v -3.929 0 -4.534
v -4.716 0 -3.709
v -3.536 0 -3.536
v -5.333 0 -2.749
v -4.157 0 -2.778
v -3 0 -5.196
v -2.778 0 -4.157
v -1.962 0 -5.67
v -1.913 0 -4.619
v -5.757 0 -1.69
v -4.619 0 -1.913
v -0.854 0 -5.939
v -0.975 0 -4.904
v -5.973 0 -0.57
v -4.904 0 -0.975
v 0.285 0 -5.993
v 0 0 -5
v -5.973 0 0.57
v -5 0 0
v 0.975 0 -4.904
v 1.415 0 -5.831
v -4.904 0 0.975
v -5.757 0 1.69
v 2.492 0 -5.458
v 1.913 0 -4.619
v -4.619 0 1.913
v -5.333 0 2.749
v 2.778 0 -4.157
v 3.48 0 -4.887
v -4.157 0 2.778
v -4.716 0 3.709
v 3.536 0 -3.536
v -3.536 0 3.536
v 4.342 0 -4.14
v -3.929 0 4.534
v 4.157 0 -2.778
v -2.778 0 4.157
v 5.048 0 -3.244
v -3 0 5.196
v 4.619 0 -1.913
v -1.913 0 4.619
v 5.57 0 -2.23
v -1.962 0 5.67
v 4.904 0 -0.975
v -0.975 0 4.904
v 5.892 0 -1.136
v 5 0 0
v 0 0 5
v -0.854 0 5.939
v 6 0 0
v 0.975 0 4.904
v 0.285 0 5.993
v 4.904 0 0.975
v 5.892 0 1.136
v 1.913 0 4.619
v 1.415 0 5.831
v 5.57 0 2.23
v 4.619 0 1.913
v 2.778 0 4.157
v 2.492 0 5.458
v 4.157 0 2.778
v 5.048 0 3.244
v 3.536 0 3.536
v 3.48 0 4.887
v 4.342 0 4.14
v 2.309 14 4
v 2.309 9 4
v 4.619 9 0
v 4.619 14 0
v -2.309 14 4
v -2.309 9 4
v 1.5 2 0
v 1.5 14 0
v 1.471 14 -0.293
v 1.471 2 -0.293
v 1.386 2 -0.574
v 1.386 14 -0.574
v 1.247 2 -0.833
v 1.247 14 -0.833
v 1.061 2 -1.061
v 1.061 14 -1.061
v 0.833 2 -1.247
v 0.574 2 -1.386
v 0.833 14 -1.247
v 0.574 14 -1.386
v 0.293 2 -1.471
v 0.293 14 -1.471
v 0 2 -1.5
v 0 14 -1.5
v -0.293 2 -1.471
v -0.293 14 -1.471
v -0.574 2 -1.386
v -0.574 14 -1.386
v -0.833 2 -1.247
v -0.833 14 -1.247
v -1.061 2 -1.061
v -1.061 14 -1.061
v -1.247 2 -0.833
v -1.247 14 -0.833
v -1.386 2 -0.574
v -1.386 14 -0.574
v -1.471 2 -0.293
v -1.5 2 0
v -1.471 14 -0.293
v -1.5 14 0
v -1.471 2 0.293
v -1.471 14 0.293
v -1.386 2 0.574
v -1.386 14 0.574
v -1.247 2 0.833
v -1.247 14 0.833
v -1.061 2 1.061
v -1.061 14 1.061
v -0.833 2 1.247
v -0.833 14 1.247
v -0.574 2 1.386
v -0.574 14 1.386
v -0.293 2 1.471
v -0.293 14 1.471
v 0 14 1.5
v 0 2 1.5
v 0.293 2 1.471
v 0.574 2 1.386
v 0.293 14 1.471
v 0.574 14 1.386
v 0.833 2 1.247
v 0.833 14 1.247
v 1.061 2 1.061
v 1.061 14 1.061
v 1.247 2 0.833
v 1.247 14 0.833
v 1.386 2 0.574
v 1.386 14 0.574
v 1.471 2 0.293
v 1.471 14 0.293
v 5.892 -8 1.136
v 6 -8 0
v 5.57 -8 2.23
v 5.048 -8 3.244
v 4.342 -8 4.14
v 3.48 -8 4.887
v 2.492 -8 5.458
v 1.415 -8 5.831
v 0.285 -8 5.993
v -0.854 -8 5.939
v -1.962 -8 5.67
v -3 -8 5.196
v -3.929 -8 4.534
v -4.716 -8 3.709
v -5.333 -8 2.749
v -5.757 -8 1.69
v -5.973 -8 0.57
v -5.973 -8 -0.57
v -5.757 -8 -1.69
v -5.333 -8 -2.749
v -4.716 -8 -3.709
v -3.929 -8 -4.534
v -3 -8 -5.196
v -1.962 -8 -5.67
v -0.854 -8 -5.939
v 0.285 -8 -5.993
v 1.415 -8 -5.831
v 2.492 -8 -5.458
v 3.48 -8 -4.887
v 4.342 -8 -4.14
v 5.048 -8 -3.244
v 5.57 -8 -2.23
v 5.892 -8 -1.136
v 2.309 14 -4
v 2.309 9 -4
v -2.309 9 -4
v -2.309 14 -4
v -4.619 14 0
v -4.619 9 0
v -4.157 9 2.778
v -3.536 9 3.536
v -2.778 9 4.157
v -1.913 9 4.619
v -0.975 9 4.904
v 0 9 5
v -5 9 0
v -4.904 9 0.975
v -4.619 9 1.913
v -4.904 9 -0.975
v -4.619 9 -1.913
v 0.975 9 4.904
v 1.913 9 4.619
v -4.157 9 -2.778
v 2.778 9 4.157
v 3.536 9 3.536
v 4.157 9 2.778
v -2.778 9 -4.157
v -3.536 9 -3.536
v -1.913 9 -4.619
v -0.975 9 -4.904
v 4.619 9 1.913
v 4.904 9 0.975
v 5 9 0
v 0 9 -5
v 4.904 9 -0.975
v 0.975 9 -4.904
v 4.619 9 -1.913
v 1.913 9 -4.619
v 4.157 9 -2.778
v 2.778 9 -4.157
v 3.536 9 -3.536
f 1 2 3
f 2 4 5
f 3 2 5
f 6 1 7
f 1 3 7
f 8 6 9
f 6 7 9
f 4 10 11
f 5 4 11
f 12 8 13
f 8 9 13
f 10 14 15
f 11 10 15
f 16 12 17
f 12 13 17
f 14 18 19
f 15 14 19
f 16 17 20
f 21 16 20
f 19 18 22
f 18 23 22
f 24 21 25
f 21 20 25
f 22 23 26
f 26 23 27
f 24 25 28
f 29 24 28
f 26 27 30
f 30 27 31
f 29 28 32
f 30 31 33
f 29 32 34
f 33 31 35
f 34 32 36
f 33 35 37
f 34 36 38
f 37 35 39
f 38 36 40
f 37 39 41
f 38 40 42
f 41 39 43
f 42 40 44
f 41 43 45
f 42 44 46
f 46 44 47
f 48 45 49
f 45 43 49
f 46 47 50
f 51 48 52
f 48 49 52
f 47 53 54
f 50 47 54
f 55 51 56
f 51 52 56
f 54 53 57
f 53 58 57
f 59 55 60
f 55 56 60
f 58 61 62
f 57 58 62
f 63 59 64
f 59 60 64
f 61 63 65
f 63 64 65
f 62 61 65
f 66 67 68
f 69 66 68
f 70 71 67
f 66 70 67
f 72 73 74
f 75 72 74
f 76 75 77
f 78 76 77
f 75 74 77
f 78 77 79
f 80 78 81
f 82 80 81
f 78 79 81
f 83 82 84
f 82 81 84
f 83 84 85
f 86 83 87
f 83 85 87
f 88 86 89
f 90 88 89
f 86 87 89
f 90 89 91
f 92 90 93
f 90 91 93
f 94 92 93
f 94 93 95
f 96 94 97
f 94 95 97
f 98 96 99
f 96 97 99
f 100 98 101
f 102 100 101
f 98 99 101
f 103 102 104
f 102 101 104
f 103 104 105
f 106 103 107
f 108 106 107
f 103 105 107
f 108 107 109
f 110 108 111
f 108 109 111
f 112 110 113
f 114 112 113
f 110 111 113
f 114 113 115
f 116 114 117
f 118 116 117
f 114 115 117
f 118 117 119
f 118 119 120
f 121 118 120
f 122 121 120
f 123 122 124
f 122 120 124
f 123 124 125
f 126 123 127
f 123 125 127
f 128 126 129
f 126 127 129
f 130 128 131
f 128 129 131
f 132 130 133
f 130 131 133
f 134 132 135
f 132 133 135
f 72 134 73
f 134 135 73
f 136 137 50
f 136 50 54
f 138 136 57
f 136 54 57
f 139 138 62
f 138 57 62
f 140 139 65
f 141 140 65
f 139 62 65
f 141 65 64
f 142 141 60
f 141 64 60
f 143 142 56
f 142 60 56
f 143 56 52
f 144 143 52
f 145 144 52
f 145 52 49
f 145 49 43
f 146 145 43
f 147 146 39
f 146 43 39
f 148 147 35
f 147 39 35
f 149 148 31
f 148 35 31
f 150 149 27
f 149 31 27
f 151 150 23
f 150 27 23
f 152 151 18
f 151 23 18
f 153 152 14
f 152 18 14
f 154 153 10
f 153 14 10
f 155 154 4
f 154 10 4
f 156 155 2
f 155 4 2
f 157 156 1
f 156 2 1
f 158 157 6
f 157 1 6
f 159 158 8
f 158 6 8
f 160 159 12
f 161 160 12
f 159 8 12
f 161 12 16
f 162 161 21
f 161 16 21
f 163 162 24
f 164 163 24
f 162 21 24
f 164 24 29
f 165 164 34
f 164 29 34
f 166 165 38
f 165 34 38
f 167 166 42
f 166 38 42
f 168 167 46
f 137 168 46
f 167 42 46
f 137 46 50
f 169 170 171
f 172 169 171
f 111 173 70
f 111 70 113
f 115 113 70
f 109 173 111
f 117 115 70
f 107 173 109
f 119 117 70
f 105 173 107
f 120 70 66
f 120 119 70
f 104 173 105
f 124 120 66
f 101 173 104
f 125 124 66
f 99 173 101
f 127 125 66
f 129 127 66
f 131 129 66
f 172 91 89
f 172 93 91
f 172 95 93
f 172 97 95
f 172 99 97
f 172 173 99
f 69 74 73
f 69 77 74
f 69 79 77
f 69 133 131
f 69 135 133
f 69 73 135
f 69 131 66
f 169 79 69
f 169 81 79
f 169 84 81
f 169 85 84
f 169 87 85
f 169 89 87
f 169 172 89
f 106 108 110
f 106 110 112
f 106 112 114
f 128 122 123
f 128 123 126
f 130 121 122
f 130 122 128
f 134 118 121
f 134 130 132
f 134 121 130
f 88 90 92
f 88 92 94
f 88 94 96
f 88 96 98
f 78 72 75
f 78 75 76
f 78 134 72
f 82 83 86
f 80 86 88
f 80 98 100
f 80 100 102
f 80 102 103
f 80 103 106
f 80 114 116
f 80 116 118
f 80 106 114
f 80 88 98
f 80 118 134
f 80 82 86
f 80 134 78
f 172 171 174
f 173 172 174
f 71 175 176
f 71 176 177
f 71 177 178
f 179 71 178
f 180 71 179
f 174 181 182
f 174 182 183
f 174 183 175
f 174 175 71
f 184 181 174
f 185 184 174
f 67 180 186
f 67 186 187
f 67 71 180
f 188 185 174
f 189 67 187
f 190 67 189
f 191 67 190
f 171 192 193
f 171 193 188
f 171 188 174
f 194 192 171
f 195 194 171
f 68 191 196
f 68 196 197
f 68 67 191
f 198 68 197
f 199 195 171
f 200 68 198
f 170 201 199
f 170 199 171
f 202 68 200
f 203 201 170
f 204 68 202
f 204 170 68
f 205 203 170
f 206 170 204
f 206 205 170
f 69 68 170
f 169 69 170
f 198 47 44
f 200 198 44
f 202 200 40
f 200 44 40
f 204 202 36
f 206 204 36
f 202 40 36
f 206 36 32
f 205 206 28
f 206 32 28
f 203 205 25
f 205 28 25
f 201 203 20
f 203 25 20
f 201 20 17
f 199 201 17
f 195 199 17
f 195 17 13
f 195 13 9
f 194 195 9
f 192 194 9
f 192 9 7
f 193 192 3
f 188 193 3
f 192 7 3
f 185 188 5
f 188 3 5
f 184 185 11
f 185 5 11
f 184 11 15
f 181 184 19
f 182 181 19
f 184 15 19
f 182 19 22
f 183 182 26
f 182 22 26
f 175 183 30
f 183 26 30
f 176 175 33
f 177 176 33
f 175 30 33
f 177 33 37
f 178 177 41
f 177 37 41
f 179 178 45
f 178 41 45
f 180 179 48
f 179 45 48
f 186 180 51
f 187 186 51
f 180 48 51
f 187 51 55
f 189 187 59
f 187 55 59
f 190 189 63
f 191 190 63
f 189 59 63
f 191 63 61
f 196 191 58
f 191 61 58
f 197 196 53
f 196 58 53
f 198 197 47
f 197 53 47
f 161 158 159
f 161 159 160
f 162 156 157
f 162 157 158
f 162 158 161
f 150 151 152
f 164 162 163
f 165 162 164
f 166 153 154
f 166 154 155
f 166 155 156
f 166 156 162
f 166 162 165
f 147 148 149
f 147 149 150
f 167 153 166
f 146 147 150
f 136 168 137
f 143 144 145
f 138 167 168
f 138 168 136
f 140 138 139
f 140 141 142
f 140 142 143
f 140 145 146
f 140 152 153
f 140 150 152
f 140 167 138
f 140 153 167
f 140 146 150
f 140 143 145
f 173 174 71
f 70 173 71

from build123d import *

# Parameters (mm, degrees)
SKETCH1_R           = 5
BOSS_EXTRUDE1_DEPTH = 9
SKETCH2_R           = 6
BOSS_EXTRUDE2_DEPTH = 8
BOSS_EXTRUDE3_DEPTH = 5
SKETCH4_R           = 1.5
CUT_EXTRUDE1_DEPTH  = 12


with BuildPart() as part:
    # Sketch1 → Boss-Extrude1 (new body)
    with BuildSketch(Plane(origin=(0, 0, 0), x_dir=(1, 0, 0), z_dir=(0, 1, 0))):
        Circle(SKETCH1_R)
    extrude(amount=BOSS_EXTRUDE1_DEPTH)

    # Sketch2 → Boss-Extrude2 (add)
    with BuildSketch(Plane.XZ):
        Circle(SKETCH2_R)
    extrude(amount=BOSS_EXTRUDE2_DEPTH)

    # Sketch3 → Boss-Extrude3 (add)
    with BuildSketch(Plane(origin=(0, 9, 0), x_dir=(1, 0, 0), z_dir=(0, 1, 0))):
        Polygon((4.618802154, 0), (2.309401077, 4), (-2.309401077, 4), (-4.618802154, 0), (-2.309401077, -4), (2.309401077, -4), align=None)
    extrude(amount=BOSS_EXTRUDE3_DEPTH)

    # Sketch4 → Cut-Extrude1 (cut)
    with BuildSketch(Plane(origin=(0, 14, 0), x_dir=(1, 0, 0), z_dir=(0, 1, 0))):
        Circle(SKETCH4_R)
    extrude(amount=-CUT_EXTRUDE1_DEPTH, mode=Mode.SUBTRACT)


solid = part.part
